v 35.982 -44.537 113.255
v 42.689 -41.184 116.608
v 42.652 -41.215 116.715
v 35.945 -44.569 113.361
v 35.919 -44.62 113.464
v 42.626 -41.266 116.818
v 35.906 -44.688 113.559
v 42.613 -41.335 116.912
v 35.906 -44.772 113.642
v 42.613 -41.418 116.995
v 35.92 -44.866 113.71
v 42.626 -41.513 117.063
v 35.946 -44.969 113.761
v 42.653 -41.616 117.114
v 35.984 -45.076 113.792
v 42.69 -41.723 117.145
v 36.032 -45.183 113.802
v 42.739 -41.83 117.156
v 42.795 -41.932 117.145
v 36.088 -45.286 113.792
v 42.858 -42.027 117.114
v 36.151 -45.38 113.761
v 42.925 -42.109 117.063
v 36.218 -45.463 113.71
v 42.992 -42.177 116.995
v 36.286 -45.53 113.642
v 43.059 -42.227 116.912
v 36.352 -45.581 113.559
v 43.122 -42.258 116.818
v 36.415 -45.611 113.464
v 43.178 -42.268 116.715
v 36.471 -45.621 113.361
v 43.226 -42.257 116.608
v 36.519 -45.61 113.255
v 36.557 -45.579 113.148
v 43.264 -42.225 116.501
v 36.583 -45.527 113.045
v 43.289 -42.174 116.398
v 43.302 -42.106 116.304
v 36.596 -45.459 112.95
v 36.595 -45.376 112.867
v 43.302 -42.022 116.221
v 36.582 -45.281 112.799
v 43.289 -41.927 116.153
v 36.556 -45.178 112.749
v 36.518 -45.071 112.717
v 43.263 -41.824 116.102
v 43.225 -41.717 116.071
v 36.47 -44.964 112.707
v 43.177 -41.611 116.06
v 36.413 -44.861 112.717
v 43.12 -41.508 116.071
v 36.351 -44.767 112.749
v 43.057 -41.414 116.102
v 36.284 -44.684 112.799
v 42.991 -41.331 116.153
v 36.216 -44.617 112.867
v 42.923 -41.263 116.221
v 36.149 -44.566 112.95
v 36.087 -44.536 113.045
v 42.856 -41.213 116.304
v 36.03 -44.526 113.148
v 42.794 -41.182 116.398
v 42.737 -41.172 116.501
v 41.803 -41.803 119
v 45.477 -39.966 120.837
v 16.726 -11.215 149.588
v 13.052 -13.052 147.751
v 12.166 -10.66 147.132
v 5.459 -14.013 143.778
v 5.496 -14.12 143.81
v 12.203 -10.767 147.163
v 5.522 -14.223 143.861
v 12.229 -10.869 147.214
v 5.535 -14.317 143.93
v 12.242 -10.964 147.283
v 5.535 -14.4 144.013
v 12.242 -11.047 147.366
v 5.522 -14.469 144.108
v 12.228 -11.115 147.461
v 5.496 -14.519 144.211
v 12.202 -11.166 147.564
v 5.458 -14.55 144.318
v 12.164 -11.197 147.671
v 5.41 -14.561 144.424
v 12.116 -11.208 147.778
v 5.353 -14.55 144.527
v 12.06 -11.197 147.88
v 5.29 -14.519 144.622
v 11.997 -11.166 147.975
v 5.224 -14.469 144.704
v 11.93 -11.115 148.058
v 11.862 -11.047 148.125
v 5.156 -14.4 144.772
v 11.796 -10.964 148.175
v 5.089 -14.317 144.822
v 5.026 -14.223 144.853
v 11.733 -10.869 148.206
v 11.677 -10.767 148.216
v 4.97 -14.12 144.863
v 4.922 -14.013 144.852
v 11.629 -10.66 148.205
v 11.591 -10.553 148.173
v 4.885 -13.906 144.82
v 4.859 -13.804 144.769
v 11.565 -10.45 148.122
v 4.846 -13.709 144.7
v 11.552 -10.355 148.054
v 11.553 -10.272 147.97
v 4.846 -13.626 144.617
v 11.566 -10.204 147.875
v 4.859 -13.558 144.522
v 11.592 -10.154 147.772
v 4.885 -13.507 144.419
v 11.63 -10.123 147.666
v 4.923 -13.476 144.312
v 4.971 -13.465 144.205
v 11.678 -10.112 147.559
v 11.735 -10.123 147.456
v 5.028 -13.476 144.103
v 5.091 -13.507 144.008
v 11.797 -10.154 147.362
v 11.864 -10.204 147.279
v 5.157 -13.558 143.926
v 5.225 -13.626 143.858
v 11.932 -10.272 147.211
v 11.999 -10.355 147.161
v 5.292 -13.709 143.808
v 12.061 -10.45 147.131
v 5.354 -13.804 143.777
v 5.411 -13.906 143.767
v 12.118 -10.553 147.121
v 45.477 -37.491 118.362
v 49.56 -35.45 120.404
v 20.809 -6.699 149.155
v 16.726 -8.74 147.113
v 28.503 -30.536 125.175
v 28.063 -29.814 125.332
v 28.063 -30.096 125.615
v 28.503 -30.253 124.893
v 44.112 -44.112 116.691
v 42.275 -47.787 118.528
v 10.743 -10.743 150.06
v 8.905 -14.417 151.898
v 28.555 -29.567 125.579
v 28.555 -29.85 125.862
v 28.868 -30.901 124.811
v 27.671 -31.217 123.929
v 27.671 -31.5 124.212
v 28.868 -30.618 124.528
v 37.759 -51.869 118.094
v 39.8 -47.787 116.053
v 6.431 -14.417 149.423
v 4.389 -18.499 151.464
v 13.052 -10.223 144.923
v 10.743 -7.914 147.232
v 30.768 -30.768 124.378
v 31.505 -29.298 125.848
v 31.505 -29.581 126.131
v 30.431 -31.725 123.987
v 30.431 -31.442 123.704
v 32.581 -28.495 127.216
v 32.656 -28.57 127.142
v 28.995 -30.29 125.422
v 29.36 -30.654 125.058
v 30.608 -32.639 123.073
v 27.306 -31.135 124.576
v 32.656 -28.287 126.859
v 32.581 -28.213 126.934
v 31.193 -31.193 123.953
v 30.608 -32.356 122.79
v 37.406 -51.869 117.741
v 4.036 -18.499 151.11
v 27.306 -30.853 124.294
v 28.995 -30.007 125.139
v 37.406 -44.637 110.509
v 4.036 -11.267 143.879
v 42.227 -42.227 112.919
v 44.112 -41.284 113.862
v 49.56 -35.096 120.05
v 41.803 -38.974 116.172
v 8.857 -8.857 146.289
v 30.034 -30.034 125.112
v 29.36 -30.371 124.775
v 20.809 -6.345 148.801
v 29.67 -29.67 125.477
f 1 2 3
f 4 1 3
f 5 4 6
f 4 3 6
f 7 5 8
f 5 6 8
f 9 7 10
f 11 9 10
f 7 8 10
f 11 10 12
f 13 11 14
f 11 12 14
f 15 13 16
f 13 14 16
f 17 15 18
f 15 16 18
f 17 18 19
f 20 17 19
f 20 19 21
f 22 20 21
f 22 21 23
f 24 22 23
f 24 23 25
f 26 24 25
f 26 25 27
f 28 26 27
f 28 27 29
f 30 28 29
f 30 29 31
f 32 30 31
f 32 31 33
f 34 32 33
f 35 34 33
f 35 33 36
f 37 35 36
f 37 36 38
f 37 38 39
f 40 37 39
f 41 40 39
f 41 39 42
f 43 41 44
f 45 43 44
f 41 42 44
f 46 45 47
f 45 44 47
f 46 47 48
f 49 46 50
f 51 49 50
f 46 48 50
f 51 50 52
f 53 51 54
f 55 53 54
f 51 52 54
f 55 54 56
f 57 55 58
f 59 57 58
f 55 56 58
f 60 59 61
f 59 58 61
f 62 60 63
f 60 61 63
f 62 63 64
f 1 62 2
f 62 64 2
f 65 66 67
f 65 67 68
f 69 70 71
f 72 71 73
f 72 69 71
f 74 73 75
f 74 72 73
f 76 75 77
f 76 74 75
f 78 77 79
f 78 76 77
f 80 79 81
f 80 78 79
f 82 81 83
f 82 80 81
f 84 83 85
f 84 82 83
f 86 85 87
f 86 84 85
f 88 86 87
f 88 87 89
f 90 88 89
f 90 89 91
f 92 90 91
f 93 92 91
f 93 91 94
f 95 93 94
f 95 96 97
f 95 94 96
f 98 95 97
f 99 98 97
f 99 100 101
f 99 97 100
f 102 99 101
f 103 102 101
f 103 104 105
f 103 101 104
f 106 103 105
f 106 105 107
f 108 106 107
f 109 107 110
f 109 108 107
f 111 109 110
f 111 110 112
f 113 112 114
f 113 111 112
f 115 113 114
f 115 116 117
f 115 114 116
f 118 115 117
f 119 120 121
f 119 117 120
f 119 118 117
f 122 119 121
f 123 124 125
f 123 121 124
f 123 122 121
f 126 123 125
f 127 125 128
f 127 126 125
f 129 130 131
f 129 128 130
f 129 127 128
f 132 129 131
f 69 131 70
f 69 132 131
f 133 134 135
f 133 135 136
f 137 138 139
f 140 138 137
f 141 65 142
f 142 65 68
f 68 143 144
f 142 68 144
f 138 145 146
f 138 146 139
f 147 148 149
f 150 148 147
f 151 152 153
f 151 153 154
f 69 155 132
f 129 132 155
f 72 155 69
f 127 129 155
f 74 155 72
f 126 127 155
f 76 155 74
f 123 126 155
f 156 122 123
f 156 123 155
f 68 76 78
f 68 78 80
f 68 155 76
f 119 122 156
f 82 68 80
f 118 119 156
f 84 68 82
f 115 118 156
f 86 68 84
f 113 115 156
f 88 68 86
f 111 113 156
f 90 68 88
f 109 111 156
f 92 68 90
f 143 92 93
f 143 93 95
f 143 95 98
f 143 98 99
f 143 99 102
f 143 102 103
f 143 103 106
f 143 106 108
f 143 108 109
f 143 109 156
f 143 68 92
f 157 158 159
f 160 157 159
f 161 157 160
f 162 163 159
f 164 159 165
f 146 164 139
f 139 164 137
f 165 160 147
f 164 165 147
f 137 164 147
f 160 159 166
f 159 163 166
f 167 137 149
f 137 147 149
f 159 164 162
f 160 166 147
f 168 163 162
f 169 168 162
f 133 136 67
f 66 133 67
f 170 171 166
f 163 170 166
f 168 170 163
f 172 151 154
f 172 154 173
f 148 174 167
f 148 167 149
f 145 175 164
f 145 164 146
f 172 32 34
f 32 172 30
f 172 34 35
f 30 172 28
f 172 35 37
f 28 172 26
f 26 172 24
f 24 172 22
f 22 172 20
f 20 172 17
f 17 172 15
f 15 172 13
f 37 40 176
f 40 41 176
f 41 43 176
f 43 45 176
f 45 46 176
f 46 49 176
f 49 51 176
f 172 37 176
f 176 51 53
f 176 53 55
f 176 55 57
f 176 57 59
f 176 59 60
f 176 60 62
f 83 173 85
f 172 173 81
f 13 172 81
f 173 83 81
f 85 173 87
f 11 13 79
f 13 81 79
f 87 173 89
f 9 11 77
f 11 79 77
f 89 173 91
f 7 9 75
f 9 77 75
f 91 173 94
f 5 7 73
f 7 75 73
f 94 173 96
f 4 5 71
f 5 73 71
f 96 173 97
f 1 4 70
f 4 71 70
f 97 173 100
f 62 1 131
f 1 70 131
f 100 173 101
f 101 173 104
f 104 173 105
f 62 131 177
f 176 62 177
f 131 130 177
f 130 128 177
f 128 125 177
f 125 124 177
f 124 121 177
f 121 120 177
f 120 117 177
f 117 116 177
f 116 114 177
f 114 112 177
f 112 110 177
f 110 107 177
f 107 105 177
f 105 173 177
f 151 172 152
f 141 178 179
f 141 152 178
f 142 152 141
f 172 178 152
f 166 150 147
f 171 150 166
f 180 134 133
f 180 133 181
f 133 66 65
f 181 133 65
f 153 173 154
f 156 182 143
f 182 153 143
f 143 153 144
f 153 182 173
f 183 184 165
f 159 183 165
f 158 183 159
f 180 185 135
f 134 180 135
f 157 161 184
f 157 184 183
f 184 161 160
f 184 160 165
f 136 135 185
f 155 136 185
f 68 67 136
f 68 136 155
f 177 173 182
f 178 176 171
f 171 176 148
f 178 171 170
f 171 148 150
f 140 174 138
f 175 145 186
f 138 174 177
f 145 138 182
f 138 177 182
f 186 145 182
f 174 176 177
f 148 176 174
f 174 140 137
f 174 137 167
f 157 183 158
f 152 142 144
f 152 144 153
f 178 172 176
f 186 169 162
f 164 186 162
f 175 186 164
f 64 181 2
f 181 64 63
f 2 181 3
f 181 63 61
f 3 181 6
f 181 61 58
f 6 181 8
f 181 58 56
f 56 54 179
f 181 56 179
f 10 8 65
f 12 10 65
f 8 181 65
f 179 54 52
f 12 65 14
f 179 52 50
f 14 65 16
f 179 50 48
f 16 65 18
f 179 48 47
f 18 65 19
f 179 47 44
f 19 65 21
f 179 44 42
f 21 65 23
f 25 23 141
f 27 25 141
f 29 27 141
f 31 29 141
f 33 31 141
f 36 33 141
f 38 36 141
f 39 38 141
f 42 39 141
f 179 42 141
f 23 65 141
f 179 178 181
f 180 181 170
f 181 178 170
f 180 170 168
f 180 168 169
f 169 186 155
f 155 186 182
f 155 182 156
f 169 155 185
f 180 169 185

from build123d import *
from build123d.topology import SkipClean

# Parameters (mm, degrees)
STOCK_GOUX_START         = -74.233053816
STOCK_GOUX_LIKED_1_DEPTH = 57.798154544
BOSS_EXTRUDE1_DEPTH      = 57.798155
CUT_EXTRUDE1_DEPTH       = 117.763925236
SKETCH6_R                = 0.6
CUT_EXTRUDE2_DEPTH       = 156.868172362
CUT_EXTRUDE4_DEPTH       = 0.4


# Read off the part's stored shape, not the designer's step: Stock-Goux Liked-1
with BuildPart() as part:
    # Stock-Goux Liked-1 outline → Stock-Goux Liked-1 (new body)
    with BuildSketch(Plane(origin=(0, 0, 0), x_dir=(0.8164965809277323, 0.40824829046385713, 0.40824829046385636), z_dir=(0.5773502691896168, -0.5773502691896308, -0.5773502691896297)).offset(STOCK_GOUX_START)):
        Polygon((60.366452966, 115.851992166), (57.866453013, 120.182119103), (57.433440297, 119.932119095), (63.338140771, 109.704877872), (75.147541717, 109.704877872), (75.147541717, 110.204877888), (70.147541811, 110.204877888), (70.147541811, 113.704878), (65.647541921, 113.704878), (63.397541976, 117.601992222), align=None)
    extrude(amount=STOCK_GOUX_LIKED_1_DEPTH)

    # Sketch2 → Boss-Extrude1 (add)
    with SkipClean():  # the faces are left unmerged after this step: merging them gives an invalid solid
        with BuildSketch(Plane(origin=(-42.858473604, 42.858473604, 42.858473604), x_dir=(0.40824829046386124, -0.4082482904638709, 0.8164965809277231), z_dir=(-0.5773502691896168, 0.5773502691896305, 0.5773502691896301))):
            Polygon((132.580982015, -10.227241223), (123.723931305, -5.113620612), (126.676281542, 0), align=None)
        extrude(amount=-BOSS_EXTRUDE1_DEPTH)

    # Sketch5 → Cut-Extrude1 (cut, through all)
    with SkipClean():  # the faces are left unmerged after this step: merging them gives an invalid solid
        with BuildSketch(Plane(origin=(0, -80.401490288, 80.401490288), x_dir=(1, 0, 0), z_dir=(0, -0.7071067811865477, 0.7071067811865475))):
            Polygon((41.80289893, 54.586651387), (44.112300006, 51.320665064), (51.869017359, 56.805492503), (49.559616282, 60.071478827), align=None)
        cut_extrude1 = extrude(amount=-CUT_EXTRUDE1_DEPTH, mode=Mode.SUBTRACT)

    # Sketch6 → Cut-Extrude2 (cut, through all)
    with SkipClean():  # the faces are left unmerged after this step: merging them gives an invalid solid
        with BuildSketch(Plane(origin=(53.600993525, 26.800496763, 26.800496763), x_dir=(0.36514837167011016, 0.18257418583505447, -0.9128709291752772), z_dir=(0.8164965809277269, 0.4082482904638622, 0.40824829046386213))):
            with Locations(Location((-98.379129588, -56.52687032, 0), (0, 0, 90))):
                Circle(SKETCH6_R)
        cut_extrude2 = extrude(amount=-CUT_EXTRUDE2_DEPTH, mode=Mode.SUBTRACT)

    # Sketch8 → Cut-Extrude4 (cut)
    with SkipClean():  # the faces are left unmerged after this step: merging them gives an invalid solid
        with BuildSketch(Plane(origin=(0, -77.573063073, 77.573063073), x_dir=(1, 0, 0), z_dir=(0, 0.7071067811865477, -0.7071067811865475))):
            Polygon((32.655977778, -69.700657922), (32.580927697, -69.806236848), (28.99506031, -67.268526511), (28.554936111, -67.890551752), (28.062658467, -67.542014091), (28.502782665, -66.919988851), (27.305797489, -66.07281337), (27.670871608, -65.557639091), (28.867856784, -66.404814572), (30.608001015, -63.945970422), align=None)
            Polygon((29.360134428, -66.753352233), (31.50478587, -68.270890293), (30.431188114, -65.239630277), align=None, mode=Mode.SUBTRACT)
        extrude(amount=-CUT_EXTRUDE4_DEPTH, mode=Mode.SUBTRACT)

    # Mirror1: Cut-Extrude1, Cut-Extrude2 across plane
    with SkipClean():  # the faces are left unmerged after this step: merging them gives an invalid solid
        add(cut_extrude1.mirror(Plane(origin=(-26.173583561, 26.173583561, 26.173583561), x_dir=(0.40824829046388933, -0.4082482904638845, 0.8164965809277022), z_dir=(0.5773502691896123, -0.5773502691896054, -0.5773502691896596))), mode=Mode.SUBTRACT)
        add(cut_extrude2.mirror(Plane(origin=(-26.173583561, 26.173583561, 26.173583561), x_dir=(0.40824829046388933, -0.4082482904638845, 0.8164965809277022), z_dir=(0.5773502691896123, -0.5773502691896054, -0.5773502691896596))), mode=Mode.SUBTRACT)


solid = part.part
